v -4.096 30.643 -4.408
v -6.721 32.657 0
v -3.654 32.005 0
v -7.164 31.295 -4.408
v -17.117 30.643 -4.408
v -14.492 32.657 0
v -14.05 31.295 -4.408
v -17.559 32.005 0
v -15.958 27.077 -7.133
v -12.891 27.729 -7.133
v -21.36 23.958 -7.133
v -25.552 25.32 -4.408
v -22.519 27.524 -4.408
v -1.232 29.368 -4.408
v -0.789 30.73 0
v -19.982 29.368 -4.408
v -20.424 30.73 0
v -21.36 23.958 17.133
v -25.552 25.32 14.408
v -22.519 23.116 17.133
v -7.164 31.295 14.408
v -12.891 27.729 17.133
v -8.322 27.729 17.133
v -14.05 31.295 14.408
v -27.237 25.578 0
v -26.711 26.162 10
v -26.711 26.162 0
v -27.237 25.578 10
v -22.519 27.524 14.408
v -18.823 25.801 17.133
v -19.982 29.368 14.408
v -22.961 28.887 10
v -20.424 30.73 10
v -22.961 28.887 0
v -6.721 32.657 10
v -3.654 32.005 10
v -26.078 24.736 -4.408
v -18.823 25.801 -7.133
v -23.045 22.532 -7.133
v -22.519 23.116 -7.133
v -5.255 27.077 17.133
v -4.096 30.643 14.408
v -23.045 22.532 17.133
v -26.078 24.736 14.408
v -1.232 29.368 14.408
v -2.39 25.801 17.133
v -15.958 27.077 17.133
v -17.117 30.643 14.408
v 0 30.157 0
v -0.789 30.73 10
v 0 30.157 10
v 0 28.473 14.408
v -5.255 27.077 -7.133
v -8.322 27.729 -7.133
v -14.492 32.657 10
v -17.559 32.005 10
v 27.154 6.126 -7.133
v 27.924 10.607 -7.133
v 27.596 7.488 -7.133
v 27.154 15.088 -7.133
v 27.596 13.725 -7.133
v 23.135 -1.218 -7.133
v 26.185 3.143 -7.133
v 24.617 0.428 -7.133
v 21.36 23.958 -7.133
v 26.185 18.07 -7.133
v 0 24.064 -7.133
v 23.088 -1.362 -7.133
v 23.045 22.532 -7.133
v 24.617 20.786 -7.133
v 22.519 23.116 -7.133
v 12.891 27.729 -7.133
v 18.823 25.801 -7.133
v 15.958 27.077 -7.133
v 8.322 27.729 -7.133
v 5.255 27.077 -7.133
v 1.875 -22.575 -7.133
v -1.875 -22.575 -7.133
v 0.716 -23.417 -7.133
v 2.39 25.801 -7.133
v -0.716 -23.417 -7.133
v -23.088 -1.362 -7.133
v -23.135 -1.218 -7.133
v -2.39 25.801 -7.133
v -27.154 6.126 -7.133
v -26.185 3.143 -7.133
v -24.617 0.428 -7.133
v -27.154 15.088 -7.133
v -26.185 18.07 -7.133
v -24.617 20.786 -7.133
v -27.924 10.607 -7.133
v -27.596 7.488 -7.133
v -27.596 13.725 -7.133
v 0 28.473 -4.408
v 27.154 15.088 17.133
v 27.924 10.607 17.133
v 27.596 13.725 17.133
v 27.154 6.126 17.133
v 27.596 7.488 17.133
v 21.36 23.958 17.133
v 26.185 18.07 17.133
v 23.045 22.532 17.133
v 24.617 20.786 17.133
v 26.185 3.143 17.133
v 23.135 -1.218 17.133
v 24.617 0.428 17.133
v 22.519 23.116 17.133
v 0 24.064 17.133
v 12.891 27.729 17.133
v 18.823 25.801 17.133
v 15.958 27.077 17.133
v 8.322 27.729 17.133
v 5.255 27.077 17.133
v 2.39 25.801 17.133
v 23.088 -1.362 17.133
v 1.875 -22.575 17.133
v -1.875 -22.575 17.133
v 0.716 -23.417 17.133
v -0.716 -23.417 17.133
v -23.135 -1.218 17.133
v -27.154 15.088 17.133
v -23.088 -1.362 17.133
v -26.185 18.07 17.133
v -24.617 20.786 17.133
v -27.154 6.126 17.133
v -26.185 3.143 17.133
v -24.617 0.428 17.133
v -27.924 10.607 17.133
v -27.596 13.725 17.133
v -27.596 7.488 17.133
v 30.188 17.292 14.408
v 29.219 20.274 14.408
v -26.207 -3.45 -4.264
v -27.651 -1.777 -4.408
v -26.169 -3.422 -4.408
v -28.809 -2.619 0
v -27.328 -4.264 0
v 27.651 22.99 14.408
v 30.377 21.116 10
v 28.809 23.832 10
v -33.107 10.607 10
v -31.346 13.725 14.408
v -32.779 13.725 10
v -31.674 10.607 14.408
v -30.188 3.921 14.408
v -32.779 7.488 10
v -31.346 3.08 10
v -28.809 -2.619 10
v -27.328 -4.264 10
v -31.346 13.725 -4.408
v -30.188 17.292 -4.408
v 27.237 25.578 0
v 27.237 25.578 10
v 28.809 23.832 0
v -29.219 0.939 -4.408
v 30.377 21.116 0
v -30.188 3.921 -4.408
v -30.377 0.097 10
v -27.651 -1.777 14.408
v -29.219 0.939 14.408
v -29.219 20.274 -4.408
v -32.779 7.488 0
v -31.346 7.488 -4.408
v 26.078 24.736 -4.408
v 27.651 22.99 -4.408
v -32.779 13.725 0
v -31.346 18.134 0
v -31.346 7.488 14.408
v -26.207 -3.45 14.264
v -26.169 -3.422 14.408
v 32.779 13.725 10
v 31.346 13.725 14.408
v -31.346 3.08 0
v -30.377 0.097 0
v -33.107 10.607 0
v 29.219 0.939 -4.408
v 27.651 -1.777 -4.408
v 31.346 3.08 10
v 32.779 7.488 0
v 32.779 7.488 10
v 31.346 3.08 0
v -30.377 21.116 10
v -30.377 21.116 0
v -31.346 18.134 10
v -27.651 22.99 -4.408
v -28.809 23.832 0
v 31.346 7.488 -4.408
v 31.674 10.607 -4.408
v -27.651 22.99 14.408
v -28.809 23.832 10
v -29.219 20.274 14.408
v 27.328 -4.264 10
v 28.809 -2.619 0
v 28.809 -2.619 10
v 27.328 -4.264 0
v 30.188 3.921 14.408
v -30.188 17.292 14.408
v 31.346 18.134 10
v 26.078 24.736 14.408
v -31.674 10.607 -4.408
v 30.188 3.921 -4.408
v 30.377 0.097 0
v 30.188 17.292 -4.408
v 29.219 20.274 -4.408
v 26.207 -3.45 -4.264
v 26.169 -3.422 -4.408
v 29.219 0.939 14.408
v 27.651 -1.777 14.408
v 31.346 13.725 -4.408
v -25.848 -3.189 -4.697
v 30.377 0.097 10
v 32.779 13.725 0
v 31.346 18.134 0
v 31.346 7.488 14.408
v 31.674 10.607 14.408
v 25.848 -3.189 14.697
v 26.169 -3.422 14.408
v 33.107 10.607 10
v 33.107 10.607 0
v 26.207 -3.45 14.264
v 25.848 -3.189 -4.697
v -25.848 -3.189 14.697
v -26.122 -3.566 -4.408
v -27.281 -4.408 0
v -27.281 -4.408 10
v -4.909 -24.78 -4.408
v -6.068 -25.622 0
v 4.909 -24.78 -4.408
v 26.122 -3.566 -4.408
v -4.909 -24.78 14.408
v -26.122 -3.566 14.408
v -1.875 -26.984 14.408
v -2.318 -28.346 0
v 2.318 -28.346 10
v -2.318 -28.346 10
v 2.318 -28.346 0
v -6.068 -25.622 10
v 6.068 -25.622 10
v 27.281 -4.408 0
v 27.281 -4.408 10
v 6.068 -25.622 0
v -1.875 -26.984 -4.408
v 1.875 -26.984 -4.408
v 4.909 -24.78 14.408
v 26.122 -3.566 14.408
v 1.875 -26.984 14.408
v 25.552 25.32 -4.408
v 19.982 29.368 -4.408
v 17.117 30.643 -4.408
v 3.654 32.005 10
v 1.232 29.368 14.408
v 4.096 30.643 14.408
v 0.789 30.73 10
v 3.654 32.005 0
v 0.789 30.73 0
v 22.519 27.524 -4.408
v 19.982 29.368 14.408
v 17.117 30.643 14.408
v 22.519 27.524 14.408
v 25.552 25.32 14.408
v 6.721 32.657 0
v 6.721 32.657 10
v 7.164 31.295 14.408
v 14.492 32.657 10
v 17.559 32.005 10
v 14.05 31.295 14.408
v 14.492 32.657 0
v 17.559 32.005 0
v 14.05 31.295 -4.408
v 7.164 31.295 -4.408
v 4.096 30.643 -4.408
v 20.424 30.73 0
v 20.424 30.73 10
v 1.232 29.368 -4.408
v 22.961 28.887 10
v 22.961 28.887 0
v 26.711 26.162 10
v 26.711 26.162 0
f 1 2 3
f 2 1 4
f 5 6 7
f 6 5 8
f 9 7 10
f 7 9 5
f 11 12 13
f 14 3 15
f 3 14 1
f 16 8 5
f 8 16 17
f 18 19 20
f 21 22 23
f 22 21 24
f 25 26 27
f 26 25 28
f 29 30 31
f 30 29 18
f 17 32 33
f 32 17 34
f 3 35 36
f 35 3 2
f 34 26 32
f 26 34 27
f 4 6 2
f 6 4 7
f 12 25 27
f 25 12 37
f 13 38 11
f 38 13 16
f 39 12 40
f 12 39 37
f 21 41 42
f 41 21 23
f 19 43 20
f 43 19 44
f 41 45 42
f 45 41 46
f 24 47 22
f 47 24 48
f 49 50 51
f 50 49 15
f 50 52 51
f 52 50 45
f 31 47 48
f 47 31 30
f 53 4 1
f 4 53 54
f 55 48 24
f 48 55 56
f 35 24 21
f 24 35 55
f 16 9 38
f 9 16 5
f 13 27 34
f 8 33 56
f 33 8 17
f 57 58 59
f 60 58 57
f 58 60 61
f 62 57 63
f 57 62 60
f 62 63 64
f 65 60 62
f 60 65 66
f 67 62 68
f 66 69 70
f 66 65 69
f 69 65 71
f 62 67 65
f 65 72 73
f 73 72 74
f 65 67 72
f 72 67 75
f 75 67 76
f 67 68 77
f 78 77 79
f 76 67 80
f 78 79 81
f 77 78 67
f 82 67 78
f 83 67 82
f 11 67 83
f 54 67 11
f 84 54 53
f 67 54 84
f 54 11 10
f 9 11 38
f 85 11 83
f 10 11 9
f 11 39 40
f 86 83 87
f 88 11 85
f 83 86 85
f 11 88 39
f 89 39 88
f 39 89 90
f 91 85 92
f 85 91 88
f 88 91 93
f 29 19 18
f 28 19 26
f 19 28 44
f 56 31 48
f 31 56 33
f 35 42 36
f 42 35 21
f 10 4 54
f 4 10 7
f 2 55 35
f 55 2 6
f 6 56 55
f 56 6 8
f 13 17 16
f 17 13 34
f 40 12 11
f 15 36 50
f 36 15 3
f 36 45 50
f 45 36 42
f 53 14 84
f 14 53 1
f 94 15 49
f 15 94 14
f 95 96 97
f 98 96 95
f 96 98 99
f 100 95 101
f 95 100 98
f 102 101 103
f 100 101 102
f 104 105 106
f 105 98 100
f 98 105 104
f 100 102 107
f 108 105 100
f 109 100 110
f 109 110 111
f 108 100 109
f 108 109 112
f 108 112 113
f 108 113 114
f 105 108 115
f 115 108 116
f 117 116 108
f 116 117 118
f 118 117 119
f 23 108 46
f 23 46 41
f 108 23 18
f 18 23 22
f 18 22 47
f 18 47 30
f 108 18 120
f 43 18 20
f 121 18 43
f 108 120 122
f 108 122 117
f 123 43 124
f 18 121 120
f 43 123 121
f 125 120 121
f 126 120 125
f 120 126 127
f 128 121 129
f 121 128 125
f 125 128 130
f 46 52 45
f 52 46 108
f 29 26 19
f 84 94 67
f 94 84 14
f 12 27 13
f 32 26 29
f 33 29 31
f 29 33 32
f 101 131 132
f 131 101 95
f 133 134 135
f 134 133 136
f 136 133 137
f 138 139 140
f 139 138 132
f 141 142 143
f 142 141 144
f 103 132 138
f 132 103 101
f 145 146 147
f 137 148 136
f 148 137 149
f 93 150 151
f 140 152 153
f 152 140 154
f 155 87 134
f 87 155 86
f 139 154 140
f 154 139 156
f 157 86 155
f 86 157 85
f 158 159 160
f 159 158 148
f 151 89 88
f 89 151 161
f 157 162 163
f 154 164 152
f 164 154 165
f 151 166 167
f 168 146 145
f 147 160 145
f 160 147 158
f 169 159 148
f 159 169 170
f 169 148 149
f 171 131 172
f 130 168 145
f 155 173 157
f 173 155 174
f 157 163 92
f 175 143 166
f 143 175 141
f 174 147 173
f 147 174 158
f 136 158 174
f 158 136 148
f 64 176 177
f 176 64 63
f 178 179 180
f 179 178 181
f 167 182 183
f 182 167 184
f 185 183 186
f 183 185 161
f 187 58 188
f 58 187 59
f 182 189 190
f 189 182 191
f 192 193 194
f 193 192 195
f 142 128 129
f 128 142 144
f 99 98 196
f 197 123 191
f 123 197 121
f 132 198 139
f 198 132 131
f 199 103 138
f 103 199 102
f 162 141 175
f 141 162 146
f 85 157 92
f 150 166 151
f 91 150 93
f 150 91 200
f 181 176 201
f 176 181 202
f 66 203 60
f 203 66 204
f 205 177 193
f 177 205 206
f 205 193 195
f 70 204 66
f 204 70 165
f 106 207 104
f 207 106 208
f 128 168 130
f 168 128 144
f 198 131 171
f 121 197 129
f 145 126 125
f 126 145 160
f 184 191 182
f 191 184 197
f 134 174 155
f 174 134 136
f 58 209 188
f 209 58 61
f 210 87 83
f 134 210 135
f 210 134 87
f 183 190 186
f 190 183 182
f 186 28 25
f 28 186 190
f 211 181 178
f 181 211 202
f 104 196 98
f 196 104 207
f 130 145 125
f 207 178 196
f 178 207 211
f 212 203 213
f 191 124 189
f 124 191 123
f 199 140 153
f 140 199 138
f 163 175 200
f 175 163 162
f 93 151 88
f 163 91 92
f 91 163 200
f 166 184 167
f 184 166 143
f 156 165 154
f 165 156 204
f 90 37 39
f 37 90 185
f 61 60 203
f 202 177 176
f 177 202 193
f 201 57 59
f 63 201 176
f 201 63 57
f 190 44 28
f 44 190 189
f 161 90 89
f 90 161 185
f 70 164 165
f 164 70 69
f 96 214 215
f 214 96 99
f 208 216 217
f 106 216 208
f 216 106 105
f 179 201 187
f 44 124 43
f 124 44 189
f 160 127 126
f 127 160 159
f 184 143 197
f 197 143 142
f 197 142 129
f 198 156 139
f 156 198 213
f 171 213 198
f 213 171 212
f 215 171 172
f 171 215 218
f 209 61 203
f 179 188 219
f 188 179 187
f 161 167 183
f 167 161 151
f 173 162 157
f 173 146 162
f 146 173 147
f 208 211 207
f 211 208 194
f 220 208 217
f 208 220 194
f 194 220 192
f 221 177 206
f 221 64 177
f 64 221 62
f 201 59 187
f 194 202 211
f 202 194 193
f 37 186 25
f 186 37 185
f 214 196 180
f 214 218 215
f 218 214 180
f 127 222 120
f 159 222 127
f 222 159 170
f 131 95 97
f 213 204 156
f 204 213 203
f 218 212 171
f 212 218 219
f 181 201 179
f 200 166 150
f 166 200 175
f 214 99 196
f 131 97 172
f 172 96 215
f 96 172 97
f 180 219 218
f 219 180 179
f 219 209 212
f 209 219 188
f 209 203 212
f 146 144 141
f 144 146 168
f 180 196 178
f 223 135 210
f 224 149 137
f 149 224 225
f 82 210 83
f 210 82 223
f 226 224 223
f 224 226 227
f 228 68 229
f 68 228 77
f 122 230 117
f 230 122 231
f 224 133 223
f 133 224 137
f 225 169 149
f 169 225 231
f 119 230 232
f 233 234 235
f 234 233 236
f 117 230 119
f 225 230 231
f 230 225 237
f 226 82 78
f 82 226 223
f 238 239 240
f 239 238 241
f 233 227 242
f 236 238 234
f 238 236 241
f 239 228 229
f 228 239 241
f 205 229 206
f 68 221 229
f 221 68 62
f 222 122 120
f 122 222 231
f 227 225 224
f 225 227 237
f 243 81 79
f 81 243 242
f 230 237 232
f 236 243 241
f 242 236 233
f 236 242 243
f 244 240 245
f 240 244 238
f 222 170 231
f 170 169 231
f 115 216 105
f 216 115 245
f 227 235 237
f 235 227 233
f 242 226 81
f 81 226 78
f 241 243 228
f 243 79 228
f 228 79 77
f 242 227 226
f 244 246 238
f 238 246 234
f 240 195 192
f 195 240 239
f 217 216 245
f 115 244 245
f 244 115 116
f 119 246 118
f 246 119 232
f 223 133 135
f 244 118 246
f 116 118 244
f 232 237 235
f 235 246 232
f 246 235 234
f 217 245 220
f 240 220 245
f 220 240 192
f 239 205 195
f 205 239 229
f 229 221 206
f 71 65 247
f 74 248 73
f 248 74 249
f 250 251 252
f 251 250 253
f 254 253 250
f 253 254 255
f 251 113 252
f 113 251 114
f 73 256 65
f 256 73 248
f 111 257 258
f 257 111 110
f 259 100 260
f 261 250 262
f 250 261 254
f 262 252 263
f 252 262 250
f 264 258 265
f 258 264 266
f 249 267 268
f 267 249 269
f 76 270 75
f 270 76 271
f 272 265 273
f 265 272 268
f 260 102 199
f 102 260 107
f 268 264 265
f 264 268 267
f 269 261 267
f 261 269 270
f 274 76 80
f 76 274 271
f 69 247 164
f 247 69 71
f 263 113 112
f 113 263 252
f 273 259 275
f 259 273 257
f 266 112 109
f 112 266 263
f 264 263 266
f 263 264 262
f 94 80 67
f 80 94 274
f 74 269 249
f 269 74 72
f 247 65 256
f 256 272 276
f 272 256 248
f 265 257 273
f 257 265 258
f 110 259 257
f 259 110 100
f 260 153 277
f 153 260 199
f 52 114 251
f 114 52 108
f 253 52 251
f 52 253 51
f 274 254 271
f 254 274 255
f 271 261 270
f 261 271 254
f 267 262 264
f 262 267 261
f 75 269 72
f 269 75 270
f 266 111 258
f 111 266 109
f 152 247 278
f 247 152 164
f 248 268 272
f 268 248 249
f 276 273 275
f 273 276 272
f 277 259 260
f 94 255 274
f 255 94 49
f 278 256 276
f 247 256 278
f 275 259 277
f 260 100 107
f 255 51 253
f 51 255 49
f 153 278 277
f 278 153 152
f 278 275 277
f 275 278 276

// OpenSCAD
module heart(circle_radius=10) {
    offset = sqrt(pow(circle_radius, 2) * 2) / 2;
    rotate(45) square(circle_radius * 2, center=true);
    translate([offset, offset, 0])
        circle(r=circle_radius);
    translate([-offset, offset, 0])
        circle(r=circle_radius);
}

minkowski() {
    linear_extrude(10) {
        heart(15);
    }
    sphere(r=7.5, $fn=10);
}
